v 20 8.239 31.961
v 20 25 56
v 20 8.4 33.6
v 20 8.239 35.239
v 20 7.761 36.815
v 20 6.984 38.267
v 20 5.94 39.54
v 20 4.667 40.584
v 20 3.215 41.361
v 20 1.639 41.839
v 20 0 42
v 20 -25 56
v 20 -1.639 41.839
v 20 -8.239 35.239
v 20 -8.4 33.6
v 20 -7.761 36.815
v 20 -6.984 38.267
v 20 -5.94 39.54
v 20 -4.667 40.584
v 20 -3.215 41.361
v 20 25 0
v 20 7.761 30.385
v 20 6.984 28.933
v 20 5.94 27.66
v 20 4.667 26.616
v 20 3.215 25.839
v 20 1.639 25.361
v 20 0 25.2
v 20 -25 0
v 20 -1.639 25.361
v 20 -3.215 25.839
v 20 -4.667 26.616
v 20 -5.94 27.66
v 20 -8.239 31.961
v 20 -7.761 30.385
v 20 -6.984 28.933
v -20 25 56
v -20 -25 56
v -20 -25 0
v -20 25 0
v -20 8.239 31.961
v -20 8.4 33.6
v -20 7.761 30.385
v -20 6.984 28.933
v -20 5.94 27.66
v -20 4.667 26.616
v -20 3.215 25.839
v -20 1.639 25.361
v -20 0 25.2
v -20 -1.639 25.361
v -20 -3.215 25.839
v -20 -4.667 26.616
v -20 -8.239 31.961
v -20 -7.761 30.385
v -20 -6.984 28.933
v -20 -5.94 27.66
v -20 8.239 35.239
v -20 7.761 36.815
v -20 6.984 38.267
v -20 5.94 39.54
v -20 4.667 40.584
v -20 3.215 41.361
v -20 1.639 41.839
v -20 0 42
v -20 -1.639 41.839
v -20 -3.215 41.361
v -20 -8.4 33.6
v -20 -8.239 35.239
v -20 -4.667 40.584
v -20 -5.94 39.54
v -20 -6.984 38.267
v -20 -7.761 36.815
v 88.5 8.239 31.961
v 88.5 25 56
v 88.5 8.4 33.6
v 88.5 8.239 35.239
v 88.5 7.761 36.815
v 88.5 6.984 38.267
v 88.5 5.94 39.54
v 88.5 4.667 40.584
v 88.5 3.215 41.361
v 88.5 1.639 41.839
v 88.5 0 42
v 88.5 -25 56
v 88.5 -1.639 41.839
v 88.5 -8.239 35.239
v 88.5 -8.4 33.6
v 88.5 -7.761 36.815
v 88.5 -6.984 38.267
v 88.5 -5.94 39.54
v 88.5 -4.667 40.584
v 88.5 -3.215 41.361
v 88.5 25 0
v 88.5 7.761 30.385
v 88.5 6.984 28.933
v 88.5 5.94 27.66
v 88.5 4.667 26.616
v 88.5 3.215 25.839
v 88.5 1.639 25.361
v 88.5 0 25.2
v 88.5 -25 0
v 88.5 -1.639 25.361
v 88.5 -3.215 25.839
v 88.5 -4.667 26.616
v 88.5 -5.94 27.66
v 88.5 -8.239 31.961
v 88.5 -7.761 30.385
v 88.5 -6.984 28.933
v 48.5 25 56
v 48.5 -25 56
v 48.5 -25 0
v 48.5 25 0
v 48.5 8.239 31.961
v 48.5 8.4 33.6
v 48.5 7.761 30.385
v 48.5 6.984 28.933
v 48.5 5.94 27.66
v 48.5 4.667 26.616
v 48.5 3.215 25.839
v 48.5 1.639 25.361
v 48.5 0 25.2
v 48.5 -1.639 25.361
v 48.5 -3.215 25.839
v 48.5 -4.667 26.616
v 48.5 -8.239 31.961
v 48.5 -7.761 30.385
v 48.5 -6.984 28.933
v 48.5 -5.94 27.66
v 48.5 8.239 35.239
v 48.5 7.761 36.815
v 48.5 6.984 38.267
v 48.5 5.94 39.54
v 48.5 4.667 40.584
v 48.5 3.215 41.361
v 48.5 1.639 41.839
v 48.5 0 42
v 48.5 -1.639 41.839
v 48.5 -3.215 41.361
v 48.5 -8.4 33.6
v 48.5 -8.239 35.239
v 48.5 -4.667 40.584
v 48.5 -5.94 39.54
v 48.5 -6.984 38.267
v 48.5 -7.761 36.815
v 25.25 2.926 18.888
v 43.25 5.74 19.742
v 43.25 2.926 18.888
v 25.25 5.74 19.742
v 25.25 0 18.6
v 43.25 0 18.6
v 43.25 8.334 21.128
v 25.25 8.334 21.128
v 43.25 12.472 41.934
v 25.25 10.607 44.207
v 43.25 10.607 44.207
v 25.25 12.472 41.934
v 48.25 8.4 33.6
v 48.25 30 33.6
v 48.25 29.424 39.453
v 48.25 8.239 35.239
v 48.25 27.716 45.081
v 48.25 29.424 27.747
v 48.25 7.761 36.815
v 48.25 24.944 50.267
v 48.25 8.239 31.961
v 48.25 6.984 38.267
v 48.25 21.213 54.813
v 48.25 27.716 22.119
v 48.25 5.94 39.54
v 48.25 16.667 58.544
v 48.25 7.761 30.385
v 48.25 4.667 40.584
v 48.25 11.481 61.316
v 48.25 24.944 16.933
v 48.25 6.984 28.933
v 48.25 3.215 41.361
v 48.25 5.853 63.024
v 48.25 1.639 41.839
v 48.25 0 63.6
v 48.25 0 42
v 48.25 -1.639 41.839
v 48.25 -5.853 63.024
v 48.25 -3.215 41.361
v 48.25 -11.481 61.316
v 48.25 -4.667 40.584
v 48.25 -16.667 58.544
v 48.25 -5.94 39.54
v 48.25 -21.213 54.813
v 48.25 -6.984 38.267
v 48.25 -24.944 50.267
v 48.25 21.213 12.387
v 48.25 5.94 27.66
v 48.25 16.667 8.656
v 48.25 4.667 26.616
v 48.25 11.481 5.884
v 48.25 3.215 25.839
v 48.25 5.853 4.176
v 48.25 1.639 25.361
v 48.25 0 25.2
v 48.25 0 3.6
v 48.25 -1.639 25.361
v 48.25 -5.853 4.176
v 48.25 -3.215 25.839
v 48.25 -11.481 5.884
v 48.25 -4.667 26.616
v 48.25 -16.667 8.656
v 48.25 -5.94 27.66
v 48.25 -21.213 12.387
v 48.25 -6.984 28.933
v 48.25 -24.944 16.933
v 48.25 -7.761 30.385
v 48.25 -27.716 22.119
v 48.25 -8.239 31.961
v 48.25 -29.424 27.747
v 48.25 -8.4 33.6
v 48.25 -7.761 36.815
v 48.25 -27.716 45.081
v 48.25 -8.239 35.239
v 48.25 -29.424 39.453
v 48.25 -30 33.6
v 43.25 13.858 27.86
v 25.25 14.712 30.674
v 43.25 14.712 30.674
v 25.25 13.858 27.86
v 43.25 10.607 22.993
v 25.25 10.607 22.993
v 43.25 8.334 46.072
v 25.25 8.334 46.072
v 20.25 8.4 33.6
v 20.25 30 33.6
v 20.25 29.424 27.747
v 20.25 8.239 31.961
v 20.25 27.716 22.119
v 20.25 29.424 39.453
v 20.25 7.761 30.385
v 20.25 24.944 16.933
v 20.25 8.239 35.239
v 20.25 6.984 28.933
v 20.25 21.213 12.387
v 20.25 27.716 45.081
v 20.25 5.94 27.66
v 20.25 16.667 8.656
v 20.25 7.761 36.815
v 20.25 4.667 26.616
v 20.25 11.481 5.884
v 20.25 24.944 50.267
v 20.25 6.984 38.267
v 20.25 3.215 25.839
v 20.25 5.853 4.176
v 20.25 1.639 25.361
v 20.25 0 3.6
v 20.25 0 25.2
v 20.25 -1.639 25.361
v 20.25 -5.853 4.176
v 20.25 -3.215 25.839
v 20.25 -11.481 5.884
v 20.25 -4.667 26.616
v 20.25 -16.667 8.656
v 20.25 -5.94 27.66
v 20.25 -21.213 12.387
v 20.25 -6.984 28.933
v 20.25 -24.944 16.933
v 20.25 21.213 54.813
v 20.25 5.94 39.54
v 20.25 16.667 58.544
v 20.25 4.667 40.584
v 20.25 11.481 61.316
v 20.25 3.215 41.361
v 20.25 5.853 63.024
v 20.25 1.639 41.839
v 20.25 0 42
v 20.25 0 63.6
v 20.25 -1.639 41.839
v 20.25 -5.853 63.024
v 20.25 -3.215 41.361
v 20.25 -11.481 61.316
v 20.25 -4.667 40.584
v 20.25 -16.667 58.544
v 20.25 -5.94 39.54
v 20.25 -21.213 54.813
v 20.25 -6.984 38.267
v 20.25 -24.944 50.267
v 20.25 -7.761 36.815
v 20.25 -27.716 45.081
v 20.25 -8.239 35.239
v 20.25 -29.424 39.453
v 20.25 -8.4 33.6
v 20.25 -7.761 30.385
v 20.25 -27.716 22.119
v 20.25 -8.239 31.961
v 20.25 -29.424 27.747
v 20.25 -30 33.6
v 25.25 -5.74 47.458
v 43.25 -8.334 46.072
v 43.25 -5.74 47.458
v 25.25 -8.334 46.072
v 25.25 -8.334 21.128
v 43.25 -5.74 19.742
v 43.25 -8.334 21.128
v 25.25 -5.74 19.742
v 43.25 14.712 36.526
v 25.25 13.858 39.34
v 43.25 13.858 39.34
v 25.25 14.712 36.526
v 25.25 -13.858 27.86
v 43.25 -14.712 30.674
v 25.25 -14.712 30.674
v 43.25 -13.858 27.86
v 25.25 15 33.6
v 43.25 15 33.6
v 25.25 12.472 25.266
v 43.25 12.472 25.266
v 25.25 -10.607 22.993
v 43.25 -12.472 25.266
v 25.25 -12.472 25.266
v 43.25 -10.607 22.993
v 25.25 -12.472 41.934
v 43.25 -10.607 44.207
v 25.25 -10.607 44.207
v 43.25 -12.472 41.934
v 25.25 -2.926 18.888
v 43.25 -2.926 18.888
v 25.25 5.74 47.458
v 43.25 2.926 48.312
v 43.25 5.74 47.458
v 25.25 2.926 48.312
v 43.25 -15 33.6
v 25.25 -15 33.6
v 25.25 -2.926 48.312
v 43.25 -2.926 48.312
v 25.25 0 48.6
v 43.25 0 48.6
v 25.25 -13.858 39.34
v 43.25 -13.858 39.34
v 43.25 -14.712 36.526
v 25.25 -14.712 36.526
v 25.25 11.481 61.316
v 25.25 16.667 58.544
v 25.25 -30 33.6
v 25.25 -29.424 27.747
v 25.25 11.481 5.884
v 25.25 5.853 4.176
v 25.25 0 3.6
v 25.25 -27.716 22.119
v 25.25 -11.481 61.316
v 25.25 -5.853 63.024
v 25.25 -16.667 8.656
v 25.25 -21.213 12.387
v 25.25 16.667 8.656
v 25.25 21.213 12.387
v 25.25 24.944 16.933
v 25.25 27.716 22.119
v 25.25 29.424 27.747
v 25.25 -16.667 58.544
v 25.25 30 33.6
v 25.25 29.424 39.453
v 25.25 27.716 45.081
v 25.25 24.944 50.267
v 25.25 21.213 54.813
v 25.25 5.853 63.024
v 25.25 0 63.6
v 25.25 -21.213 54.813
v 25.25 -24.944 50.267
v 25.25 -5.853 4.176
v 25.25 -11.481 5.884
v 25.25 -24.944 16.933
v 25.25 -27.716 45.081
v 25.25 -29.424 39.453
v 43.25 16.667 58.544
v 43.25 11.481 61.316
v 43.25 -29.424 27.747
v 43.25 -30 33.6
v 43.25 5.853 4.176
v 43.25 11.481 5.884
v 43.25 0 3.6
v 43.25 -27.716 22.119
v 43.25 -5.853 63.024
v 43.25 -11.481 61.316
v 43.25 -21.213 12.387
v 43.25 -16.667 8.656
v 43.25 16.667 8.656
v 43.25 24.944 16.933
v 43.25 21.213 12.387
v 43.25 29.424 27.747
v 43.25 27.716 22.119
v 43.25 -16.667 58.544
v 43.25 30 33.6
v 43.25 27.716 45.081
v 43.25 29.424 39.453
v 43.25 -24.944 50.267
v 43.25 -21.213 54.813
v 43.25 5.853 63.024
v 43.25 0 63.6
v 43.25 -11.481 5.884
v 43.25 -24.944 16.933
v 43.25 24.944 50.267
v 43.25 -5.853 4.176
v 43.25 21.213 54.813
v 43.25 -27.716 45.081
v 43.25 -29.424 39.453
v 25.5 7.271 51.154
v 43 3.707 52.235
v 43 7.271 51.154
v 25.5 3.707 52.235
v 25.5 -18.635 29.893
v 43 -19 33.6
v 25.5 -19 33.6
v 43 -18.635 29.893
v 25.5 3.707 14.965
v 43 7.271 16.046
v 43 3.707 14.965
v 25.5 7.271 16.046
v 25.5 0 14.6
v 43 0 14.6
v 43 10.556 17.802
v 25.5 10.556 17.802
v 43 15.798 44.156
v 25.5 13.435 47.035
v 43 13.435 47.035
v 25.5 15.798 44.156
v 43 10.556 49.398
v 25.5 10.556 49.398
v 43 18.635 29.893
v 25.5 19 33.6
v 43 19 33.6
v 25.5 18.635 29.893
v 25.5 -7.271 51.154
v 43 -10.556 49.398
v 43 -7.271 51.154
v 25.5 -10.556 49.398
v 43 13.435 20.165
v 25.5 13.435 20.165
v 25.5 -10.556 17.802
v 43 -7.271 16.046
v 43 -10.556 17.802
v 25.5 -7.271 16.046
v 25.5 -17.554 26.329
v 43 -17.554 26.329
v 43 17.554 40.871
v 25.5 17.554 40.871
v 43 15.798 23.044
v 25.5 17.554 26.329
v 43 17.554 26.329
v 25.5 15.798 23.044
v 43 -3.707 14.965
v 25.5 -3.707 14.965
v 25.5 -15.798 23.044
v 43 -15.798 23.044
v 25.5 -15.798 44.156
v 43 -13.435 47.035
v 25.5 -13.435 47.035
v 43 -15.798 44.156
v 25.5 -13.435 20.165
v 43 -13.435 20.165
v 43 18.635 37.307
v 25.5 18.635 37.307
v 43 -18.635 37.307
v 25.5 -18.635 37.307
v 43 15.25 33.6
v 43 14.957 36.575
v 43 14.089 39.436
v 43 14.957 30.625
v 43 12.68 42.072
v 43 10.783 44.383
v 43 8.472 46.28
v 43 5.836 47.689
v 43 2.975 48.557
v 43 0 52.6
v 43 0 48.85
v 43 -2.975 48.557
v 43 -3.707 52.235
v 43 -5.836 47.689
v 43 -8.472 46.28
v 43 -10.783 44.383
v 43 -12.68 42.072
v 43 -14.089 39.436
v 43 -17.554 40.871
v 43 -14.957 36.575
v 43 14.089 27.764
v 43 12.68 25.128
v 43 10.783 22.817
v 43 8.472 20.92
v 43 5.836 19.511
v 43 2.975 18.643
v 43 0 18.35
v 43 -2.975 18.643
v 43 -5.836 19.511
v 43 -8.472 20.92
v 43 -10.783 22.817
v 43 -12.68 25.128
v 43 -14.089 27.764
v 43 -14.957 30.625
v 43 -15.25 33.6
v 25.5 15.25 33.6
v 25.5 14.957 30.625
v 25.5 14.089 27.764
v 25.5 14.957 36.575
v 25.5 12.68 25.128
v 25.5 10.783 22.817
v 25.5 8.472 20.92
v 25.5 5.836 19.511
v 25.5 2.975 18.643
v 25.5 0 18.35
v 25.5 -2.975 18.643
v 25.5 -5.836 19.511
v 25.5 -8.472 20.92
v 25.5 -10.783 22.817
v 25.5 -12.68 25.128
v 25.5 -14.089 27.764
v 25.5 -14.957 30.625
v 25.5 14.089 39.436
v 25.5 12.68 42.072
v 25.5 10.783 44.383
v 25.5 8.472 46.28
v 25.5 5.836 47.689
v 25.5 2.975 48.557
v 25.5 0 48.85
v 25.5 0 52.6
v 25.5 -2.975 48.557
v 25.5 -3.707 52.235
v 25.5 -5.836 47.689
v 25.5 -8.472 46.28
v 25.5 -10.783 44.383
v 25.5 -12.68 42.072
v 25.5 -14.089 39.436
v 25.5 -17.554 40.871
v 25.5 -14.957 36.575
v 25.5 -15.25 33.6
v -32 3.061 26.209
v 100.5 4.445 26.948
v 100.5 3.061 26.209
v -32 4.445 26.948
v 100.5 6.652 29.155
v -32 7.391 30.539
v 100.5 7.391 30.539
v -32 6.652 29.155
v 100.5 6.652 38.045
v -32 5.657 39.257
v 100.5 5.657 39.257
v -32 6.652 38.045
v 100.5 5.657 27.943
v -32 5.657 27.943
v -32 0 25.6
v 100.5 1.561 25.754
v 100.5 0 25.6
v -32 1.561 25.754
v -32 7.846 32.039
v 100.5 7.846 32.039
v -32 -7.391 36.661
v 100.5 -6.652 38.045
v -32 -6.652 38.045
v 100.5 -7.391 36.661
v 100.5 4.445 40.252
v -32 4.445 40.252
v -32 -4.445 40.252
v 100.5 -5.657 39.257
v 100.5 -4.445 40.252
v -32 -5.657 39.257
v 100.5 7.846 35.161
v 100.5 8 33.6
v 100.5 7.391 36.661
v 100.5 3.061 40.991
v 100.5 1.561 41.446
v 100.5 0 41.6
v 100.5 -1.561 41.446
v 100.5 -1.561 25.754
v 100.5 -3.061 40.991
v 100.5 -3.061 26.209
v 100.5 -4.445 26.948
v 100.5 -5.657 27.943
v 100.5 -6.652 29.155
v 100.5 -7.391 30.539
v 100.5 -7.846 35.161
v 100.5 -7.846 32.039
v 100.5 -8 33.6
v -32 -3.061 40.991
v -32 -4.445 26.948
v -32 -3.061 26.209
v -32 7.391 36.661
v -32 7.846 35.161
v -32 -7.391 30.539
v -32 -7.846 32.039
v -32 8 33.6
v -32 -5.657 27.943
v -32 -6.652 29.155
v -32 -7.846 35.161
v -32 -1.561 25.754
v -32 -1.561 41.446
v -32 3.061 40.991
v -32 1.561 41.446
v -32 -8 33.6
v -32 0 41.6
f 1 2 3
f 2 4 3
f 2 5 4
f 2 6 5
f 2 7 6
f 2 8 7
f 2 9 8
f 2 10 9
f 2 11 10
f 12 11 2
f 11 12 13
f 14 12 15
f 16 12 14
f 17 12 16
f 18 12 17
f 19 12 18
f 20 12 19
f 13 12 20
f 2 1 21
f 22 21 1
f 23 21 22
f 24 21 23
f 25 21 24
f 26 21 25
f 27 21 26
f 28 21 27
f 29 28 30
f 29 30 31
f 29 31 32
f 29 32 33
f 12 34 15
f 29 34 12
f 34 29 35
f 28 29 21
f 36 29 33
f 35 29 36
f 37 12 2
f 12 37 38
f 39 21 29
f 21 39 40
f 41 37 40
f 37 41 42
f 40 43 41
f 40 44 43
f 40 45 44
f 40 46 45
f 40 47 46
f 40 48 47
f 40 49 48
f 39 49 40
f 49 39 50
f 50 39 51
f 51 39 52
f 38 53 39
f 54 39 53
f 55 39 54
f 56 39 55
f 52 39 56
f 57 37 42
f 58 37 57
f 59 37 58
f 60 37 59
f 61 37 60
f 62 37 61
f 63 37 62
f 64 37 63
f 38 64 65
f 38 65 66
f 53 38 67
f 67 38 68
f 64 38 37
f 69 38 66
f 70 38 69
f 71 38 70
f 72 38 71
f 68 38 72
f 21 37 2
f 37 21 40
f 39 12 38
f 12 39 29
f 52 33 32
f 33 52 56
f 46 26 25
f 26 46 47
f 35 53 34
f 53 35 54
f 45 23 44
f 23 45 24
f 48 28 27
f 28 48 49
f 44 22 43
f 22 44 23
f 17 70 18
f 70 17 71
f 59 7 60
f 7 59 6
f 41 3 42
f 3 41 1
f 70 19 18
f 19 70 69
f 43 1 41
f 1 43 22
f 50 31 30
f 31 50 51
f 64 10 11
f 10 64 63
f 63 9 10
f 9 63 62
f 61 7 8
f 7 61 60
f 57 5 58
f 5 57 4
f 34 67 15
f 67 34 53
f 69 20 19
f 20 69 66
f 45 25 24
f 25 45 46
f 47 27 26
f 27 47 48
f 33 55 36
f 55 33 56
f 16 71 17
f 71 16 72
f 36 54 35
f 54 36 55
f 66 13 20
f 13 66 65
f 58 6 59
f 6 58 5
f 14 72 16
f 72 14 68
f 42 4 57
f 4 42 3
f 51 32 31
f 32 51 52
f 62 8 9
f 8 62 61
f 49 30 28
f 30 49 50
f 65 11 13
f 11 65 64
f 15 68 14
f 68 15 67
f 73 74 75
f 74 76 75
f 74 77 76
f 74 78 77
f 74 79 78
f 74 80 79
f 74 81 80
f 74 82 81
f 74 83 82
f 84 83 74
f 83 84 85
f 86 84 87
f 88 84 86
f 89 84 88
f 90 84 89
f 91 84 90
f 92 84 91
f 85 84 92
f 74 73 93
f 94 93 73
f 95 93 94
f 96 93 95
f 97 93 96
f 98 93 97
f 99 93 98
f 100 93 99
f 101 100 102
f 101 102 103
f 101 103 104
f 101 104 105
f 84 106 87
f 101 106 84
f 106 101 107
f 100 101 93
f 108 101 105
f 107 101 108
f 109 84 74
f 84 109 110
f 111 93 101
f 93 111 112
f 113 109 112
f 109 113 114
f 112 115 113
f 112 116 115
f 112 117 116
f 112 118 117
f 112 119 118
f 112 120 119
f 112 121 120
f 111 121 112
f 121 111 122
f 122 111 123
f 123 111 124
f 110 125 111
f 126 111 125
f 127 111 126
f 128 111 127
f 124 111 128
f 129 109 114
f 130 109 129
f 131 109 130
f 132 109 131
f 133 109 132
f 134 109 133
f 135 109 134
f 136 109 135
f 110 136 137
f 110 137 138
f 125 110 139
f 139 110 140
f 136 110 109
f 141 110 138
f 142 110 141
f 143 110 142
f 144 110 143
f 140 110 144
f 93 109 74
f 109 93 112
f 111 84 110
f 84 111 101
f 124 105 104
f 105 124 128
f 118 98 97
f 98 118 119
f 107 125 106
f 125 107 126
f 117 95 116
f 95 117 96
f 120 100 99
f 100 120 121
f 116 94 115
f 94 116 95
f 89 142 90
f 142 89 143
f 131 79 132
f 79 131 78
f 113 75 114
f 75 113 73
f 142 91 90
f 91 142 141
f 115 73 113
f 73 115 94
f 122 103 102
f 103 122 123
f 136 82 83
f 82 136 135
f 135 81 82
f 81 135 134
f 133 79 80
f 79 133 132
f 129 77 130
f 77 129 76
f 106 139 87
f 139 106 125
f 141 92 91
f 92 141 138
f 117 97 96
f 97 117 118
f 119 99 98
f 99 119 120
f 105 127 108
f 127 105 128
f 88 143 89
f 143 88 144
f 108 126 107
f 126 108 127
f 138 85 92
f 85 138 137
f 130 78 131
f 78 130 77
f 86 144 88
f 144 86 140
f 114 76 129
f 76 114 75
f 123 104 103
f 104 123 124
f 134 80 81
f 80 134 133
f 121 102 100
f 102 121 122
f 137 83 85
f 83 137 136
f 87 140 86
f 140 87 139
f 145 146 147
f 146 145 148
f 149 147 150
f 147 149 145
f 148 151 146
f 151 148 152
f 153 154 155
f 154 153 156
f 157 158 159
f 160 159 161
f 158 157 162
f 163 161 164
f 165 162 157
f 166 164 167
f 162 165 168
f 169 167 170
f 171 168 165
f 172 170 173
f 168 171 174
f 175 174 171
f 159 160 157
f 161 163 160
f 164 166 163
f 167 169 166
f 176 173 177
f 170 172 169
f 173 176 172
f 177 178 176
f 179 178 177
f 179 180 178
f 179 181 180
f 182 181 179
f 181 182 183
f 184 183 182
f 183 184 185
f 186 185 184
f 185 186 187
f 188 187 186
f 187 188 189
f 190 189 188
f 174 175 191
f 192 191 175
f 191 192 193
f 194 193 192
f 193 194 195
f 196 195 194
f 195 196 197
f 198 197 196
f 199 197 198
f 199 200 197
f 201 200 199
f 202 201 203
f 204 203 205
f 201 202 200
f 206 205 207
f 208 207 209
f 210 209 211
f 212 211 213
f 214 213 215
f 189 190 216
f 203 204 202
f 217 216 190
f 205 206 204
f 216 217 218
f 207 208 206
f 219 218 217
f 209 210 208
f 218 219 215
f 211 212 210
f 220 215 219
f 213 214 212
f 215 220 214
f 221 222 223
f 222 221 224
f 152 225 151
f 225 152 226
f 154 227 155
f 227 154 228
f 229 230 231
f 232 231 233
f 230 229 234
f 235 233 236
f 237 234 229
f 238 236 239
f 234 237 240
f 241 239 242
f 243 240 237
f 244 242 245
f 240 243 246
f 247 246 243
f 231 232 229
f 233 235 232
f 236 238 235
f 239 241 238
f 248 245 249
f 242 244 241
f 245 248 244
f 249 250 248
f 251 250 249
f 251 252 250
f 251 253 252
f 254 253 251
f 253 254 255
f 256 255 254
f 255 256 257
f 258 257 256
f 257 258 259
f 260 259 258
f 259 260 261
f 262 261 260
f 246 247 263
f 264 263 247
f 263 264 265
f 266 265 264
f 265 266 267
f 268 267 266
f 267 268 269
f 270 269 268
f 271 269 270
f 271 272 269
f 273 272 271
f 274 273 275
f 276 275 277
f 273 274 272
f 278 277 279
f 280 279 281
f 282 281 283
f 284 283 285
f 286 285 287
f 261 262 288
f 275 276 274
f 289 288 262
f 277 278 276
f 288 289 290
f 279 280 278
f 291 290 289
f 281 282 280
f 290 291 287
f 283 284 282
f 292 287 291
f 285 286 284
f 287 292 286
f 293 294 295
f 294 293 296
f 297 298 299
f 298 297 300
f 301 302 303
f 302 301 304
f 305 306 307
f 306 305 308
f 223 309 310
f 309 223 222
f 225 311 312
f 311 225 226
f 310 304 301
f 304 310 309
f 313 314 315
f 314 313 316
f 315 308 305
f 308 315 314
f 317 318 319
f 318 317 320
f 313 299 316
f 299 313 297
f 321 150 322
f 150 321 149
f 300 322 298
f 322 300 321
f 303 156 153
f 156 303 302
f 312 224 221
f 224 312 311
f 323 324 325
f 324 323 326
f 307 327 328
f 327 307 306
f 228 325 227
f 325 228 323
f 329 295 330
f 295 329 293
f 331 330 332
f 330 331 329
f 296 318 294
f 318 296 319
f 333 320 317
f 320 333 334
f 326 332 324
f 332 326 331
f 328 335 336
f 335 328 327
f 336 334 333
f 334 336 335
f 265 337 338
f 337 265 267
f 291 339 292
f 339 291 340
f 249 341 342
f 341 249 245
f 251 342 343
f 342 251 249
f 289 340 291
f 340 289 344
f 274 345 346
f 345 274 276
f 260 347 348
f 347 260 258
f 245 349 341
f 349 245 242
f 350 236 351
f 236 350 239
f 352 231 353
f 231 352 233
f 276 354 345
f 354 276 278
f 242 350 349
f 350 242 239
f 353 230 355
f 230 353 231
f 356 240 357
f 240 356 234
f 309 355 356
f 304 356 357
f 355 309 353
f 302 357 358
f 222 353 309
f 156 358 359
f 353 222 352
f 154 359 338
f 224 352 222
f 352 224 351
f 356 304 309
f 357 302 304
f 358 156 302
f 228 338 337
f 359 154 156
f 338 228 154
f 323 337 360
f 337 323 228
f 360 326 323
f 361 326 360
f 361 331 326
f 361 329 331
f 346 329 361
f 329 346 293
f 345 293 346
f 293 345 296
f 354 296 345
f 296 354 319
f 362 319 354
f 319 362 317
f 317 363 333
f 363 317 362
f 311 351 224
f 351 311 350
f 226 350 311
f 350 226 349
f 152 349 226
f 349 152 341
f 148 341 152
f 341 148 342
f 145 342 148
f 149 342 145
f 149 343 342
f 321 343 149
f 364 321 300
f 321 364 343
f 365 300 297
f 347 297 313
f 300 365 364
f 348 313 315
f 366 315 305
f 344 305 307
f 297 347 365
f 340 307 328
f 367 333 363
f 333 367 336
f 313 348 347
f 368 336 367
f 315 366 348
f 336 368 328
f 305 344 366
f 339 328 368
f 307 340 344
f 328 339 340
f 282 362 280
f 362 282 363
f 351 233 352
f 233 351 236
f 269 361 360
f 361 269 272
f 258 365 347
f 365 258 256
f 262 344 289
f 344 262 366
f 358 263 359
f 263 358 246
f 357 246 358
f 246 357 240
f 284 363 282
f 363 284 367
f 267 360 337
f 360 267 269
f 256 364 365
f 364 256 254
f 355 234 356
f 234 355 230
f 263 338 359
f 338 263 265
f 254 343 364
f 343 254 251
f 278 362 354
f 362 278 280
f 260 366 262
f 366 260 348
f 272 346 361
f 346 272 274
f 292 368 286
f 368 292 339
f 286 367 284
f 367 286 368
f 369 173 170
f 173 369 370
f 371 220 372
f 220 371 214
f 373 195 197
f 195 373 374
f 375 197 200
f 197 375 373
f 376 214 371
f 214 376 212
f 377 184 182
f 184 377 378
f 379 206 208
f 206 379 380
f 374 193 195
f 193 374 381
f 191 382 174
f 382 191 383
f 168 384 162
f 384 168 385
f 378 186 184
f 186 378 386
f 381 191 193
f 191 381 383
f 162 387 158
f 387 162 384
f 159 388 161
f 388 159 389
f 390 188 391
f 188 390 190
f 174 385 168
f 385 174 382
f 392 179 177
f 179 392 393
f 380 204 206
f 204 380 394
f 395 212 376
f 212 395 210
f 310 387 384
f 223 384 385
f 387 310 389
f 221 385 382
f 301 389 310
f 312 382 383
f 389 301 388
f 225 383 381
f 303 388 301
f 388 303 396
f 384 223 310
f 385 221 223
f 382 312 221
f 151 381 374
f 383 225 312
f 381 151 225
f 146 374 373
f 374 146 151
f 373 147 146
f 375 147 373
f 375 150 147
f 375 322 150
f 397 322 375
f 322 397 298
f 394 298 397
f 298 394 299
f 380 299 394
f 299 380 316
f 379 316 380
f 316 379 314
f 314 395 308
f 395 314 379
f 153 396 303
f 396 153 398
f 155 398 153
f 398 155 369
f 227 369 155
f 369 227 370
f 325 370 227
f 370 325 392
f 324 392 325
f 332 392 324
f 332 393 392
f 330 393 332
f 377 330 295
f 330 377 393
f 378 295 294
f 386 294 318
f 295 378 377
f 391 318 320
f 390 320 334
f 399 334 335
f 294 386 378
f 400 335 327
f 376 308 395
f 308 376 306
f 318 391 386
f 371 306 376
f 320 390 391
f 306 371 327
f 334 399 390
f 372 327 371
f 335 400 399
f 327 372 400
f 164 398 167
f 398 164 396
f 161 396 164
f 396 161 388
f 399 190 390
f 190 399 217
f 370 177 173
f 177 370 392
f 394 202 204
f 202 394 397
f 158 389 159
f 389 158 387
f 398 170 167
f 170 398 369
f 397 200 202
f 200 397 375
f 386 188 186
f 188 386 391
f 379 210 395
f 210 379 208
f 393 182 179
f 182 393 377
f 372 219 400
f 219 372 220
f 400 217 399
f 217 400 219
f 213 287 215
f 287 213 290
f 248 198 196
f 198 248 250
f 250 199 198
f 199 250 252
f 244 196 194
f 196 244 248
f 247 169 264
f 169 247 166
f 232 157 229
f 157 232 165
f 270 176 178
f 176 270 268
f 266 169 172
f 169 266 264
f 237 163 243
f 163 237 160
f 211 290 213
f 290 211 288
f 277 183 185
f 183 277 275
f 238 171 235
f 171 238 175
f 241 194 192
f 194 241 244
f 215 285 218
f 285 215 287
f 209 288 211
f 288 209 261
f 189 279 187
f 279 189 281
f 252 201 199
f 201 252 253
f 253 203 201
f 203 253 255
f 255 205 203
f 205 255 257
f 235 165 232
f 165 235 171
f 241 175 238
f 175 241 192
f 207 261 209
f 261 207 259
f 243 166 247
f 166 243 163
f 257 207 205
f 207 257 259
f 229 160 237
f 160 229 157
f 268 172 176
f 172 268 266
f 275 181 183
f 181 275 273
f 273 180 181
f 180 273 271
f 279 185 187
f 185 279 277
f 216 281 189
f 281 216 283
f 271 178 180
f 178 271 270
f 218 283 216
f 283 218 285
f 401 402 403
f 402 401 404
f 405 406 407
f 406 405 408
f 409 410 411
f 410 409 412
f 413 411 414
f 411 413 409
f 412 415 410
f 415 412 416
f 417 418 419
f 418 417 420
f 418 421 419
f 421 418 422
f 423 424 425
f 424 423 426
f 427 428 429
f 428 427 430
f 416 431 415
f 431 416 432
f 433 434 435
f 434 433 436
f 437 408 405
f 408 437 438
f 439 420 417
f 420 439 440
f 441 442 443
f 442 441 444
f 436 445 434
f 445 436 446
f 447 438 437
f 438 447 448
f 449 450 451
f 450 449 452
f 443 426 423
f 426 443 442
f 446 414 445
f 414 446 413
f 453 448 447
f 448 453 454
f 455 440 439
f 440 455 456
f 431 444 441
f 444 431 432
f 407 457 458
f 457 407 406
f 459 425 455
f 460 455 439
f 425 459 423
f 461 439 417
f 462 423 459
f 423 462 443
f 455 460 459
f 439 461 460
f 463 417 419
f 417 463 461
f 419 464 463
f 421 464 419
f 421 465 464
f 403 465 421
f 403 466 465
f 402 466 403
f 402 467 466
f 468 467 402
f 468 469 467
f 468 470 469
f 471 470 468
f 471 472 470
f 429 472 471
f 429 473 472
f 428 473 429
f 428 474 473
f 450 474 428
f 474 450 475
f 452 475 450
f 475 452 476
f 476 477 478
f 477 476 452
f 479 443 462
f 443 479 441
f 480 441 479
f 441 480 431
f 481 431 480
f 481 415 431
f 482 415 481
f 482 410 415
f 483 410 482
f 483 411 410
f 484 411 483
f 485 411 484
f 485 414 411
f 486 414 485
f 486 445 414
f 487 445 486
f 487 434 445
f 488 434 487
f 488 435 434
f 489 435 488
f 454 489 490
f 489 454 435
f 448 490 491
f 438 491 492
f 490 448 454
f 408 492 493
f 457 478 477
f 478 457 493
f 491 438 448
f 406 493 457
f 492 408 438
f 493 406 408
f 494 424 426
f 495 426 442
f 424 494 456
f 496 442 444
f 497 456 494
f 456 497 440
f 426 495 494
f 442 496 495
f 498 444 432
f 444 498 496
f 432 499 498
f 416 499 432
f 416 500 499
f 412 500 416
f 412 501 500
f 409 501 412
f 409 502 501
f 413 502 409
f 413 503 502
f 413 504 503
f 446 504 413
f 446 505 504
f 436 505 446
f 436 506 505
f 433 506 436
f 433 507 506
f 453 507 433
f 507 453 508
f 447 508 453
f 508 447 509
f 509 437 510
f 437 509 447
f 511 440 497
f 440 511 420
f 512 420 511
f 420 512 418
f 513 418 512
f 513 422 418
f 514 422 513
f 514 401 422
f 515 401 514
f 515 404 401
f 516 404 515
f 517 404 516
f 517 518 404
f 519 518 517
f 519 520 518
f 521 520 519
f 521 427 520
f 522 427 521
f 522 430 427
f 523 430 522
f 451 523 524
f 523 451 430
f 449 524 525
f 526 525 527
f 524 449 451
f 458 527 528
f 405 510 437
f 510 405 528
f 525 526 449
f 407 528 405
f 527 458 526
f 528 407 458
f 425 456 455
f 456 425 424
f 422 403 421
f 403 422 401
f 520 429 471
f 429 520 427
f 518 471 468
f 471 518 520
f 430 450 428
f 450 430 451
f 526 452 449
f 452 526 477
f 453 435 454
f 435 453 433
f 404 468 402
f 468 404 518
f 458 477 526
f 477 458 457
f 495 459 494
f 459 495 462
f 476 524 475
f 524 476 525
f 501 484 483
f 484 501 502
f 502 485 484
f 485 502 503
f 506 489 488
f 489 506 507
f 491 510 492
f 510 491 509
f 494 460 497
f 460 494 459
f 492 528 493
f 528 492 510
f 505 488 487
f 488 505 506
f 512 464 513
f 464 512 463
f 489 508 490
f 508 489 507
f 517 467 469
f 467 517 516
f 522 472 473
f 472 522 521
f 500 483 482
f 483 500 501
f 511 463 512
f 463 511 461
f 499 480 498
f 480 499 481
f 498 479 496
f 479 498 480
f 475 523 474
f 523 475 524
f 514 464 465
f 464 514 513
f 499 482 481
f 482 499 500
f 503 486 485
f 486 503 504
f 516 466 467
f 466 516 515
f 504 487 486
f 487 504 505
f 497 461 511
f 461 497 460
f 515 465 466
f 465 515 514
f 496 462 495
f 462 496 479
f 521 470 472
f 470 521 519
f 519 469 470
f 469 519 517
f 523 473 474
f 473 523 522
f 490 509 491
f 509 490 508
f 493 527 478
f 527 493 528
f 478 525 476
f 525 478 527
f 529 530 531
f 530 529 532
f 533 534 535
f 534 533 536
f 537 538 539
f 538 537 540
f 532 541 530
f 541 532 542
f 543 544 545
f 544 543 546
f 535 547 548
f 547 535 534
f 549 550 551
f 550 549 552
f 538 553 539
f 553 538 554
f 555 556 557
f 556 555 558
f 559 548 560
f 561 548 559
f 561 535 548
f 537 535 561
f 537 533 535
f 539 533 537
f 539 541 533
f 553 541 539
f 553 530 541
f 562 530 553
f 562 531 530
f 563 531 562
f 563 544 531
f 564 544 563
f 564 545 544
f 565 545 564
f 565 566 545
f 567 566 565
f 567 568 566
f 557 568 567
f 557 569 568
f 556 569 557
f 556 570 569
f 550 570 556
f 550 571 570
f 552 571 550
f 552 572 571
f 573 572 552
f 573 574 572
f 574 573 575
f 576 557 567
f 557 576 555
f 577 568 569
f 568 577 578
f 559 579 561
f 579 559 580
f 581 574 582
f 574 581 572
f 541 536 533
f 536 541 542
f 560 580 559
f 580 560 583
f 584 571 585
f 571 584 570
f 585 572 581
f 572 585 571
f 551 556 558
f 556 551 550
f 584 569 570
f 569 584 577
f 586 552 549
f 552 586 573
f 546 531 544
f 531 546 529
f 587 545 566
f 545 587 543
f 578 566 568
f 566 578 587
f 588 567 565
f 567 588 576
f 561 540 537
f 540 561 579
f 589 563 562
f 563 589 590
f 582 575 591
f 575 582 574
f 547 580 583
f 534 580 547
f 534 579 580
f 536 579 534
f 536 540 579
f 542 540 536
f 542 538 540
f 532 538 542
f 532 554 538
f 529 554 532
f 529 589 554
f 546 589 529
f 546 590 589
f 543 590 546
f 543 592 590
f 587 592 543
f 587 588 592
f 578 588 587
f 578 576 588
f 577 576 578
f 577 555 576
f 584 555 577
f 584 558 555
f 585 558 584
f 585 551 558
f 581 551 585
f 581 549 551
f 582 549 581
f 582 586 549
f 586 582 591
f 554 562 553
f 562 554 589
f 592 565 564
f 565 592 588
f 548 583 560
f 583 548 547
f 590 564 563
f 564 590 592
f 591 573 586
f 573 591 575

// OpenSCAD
$fn = 32;

// ------------------------------------------------------------------------
// Pulley assembly: d60 pulley with a belt, shaft d16
// Every part is its own module, assembly() places them once.
// ------------------------------------------------------------------------

// --- part 1 ---
module support1() {
  difference() {
    translate([-20, -25, 0]) cube([40, 50, 56]);
    translate([0, 0, 33.6]) rotate([0, 90, 0]) cylinder(h = 42, d = 16.8, center = true);
  }
}

// --- part 2 ---
module support2() {
  difference() {
    translate([-20, -25, 0]) cube([40, 50, 56]);
    translate([0, 0, 33.6]) rotate([0, 90, 0]) cylinder(h = 42, d = 16.8, center = true);
  }
}

// --- part 3 ---
module shaft() {
  translate([0, 0, -66.25]) cylinder(h = 132.5, d = 16);
}

// --- part 4 ---
module pulley() {
  difference() {
    union() {
      cylinder(h = 28, d = 30);
      cylinder(h = 5, d = 60);
      translate([0, 0, 23]) cylinder(h = 5, d = 60);
    }
    translate([0, 0, -1]) cylinder(h = 30, d = 16.8);
  }
}

// --- part 5 ---
module belt() {
  difference() {
      translate([0, 0, 0]) cylinder(h = 17.5, d = 38);
      translate([0, 0, -1]) cylinder(h = 19.5, d = 30.5);
    }
}

// --- assembly ---
module assembly() {
  translate([0, 0, 0]) rotate([0, 0, 0]) support1();
  translate([68.5, 0, 0]) rotate([0, 0, 0]) support2();
  translate([34.25, 0, 33.6]) rotate([0, 90, 0]) shaft();
  translate([20.25, 0, 33.6]) rotate([0, 90, 0]) pulley();
  translate([25.5, 0, 33.6]) rotate([0, 90, 0]) belt();
}

assembly();
